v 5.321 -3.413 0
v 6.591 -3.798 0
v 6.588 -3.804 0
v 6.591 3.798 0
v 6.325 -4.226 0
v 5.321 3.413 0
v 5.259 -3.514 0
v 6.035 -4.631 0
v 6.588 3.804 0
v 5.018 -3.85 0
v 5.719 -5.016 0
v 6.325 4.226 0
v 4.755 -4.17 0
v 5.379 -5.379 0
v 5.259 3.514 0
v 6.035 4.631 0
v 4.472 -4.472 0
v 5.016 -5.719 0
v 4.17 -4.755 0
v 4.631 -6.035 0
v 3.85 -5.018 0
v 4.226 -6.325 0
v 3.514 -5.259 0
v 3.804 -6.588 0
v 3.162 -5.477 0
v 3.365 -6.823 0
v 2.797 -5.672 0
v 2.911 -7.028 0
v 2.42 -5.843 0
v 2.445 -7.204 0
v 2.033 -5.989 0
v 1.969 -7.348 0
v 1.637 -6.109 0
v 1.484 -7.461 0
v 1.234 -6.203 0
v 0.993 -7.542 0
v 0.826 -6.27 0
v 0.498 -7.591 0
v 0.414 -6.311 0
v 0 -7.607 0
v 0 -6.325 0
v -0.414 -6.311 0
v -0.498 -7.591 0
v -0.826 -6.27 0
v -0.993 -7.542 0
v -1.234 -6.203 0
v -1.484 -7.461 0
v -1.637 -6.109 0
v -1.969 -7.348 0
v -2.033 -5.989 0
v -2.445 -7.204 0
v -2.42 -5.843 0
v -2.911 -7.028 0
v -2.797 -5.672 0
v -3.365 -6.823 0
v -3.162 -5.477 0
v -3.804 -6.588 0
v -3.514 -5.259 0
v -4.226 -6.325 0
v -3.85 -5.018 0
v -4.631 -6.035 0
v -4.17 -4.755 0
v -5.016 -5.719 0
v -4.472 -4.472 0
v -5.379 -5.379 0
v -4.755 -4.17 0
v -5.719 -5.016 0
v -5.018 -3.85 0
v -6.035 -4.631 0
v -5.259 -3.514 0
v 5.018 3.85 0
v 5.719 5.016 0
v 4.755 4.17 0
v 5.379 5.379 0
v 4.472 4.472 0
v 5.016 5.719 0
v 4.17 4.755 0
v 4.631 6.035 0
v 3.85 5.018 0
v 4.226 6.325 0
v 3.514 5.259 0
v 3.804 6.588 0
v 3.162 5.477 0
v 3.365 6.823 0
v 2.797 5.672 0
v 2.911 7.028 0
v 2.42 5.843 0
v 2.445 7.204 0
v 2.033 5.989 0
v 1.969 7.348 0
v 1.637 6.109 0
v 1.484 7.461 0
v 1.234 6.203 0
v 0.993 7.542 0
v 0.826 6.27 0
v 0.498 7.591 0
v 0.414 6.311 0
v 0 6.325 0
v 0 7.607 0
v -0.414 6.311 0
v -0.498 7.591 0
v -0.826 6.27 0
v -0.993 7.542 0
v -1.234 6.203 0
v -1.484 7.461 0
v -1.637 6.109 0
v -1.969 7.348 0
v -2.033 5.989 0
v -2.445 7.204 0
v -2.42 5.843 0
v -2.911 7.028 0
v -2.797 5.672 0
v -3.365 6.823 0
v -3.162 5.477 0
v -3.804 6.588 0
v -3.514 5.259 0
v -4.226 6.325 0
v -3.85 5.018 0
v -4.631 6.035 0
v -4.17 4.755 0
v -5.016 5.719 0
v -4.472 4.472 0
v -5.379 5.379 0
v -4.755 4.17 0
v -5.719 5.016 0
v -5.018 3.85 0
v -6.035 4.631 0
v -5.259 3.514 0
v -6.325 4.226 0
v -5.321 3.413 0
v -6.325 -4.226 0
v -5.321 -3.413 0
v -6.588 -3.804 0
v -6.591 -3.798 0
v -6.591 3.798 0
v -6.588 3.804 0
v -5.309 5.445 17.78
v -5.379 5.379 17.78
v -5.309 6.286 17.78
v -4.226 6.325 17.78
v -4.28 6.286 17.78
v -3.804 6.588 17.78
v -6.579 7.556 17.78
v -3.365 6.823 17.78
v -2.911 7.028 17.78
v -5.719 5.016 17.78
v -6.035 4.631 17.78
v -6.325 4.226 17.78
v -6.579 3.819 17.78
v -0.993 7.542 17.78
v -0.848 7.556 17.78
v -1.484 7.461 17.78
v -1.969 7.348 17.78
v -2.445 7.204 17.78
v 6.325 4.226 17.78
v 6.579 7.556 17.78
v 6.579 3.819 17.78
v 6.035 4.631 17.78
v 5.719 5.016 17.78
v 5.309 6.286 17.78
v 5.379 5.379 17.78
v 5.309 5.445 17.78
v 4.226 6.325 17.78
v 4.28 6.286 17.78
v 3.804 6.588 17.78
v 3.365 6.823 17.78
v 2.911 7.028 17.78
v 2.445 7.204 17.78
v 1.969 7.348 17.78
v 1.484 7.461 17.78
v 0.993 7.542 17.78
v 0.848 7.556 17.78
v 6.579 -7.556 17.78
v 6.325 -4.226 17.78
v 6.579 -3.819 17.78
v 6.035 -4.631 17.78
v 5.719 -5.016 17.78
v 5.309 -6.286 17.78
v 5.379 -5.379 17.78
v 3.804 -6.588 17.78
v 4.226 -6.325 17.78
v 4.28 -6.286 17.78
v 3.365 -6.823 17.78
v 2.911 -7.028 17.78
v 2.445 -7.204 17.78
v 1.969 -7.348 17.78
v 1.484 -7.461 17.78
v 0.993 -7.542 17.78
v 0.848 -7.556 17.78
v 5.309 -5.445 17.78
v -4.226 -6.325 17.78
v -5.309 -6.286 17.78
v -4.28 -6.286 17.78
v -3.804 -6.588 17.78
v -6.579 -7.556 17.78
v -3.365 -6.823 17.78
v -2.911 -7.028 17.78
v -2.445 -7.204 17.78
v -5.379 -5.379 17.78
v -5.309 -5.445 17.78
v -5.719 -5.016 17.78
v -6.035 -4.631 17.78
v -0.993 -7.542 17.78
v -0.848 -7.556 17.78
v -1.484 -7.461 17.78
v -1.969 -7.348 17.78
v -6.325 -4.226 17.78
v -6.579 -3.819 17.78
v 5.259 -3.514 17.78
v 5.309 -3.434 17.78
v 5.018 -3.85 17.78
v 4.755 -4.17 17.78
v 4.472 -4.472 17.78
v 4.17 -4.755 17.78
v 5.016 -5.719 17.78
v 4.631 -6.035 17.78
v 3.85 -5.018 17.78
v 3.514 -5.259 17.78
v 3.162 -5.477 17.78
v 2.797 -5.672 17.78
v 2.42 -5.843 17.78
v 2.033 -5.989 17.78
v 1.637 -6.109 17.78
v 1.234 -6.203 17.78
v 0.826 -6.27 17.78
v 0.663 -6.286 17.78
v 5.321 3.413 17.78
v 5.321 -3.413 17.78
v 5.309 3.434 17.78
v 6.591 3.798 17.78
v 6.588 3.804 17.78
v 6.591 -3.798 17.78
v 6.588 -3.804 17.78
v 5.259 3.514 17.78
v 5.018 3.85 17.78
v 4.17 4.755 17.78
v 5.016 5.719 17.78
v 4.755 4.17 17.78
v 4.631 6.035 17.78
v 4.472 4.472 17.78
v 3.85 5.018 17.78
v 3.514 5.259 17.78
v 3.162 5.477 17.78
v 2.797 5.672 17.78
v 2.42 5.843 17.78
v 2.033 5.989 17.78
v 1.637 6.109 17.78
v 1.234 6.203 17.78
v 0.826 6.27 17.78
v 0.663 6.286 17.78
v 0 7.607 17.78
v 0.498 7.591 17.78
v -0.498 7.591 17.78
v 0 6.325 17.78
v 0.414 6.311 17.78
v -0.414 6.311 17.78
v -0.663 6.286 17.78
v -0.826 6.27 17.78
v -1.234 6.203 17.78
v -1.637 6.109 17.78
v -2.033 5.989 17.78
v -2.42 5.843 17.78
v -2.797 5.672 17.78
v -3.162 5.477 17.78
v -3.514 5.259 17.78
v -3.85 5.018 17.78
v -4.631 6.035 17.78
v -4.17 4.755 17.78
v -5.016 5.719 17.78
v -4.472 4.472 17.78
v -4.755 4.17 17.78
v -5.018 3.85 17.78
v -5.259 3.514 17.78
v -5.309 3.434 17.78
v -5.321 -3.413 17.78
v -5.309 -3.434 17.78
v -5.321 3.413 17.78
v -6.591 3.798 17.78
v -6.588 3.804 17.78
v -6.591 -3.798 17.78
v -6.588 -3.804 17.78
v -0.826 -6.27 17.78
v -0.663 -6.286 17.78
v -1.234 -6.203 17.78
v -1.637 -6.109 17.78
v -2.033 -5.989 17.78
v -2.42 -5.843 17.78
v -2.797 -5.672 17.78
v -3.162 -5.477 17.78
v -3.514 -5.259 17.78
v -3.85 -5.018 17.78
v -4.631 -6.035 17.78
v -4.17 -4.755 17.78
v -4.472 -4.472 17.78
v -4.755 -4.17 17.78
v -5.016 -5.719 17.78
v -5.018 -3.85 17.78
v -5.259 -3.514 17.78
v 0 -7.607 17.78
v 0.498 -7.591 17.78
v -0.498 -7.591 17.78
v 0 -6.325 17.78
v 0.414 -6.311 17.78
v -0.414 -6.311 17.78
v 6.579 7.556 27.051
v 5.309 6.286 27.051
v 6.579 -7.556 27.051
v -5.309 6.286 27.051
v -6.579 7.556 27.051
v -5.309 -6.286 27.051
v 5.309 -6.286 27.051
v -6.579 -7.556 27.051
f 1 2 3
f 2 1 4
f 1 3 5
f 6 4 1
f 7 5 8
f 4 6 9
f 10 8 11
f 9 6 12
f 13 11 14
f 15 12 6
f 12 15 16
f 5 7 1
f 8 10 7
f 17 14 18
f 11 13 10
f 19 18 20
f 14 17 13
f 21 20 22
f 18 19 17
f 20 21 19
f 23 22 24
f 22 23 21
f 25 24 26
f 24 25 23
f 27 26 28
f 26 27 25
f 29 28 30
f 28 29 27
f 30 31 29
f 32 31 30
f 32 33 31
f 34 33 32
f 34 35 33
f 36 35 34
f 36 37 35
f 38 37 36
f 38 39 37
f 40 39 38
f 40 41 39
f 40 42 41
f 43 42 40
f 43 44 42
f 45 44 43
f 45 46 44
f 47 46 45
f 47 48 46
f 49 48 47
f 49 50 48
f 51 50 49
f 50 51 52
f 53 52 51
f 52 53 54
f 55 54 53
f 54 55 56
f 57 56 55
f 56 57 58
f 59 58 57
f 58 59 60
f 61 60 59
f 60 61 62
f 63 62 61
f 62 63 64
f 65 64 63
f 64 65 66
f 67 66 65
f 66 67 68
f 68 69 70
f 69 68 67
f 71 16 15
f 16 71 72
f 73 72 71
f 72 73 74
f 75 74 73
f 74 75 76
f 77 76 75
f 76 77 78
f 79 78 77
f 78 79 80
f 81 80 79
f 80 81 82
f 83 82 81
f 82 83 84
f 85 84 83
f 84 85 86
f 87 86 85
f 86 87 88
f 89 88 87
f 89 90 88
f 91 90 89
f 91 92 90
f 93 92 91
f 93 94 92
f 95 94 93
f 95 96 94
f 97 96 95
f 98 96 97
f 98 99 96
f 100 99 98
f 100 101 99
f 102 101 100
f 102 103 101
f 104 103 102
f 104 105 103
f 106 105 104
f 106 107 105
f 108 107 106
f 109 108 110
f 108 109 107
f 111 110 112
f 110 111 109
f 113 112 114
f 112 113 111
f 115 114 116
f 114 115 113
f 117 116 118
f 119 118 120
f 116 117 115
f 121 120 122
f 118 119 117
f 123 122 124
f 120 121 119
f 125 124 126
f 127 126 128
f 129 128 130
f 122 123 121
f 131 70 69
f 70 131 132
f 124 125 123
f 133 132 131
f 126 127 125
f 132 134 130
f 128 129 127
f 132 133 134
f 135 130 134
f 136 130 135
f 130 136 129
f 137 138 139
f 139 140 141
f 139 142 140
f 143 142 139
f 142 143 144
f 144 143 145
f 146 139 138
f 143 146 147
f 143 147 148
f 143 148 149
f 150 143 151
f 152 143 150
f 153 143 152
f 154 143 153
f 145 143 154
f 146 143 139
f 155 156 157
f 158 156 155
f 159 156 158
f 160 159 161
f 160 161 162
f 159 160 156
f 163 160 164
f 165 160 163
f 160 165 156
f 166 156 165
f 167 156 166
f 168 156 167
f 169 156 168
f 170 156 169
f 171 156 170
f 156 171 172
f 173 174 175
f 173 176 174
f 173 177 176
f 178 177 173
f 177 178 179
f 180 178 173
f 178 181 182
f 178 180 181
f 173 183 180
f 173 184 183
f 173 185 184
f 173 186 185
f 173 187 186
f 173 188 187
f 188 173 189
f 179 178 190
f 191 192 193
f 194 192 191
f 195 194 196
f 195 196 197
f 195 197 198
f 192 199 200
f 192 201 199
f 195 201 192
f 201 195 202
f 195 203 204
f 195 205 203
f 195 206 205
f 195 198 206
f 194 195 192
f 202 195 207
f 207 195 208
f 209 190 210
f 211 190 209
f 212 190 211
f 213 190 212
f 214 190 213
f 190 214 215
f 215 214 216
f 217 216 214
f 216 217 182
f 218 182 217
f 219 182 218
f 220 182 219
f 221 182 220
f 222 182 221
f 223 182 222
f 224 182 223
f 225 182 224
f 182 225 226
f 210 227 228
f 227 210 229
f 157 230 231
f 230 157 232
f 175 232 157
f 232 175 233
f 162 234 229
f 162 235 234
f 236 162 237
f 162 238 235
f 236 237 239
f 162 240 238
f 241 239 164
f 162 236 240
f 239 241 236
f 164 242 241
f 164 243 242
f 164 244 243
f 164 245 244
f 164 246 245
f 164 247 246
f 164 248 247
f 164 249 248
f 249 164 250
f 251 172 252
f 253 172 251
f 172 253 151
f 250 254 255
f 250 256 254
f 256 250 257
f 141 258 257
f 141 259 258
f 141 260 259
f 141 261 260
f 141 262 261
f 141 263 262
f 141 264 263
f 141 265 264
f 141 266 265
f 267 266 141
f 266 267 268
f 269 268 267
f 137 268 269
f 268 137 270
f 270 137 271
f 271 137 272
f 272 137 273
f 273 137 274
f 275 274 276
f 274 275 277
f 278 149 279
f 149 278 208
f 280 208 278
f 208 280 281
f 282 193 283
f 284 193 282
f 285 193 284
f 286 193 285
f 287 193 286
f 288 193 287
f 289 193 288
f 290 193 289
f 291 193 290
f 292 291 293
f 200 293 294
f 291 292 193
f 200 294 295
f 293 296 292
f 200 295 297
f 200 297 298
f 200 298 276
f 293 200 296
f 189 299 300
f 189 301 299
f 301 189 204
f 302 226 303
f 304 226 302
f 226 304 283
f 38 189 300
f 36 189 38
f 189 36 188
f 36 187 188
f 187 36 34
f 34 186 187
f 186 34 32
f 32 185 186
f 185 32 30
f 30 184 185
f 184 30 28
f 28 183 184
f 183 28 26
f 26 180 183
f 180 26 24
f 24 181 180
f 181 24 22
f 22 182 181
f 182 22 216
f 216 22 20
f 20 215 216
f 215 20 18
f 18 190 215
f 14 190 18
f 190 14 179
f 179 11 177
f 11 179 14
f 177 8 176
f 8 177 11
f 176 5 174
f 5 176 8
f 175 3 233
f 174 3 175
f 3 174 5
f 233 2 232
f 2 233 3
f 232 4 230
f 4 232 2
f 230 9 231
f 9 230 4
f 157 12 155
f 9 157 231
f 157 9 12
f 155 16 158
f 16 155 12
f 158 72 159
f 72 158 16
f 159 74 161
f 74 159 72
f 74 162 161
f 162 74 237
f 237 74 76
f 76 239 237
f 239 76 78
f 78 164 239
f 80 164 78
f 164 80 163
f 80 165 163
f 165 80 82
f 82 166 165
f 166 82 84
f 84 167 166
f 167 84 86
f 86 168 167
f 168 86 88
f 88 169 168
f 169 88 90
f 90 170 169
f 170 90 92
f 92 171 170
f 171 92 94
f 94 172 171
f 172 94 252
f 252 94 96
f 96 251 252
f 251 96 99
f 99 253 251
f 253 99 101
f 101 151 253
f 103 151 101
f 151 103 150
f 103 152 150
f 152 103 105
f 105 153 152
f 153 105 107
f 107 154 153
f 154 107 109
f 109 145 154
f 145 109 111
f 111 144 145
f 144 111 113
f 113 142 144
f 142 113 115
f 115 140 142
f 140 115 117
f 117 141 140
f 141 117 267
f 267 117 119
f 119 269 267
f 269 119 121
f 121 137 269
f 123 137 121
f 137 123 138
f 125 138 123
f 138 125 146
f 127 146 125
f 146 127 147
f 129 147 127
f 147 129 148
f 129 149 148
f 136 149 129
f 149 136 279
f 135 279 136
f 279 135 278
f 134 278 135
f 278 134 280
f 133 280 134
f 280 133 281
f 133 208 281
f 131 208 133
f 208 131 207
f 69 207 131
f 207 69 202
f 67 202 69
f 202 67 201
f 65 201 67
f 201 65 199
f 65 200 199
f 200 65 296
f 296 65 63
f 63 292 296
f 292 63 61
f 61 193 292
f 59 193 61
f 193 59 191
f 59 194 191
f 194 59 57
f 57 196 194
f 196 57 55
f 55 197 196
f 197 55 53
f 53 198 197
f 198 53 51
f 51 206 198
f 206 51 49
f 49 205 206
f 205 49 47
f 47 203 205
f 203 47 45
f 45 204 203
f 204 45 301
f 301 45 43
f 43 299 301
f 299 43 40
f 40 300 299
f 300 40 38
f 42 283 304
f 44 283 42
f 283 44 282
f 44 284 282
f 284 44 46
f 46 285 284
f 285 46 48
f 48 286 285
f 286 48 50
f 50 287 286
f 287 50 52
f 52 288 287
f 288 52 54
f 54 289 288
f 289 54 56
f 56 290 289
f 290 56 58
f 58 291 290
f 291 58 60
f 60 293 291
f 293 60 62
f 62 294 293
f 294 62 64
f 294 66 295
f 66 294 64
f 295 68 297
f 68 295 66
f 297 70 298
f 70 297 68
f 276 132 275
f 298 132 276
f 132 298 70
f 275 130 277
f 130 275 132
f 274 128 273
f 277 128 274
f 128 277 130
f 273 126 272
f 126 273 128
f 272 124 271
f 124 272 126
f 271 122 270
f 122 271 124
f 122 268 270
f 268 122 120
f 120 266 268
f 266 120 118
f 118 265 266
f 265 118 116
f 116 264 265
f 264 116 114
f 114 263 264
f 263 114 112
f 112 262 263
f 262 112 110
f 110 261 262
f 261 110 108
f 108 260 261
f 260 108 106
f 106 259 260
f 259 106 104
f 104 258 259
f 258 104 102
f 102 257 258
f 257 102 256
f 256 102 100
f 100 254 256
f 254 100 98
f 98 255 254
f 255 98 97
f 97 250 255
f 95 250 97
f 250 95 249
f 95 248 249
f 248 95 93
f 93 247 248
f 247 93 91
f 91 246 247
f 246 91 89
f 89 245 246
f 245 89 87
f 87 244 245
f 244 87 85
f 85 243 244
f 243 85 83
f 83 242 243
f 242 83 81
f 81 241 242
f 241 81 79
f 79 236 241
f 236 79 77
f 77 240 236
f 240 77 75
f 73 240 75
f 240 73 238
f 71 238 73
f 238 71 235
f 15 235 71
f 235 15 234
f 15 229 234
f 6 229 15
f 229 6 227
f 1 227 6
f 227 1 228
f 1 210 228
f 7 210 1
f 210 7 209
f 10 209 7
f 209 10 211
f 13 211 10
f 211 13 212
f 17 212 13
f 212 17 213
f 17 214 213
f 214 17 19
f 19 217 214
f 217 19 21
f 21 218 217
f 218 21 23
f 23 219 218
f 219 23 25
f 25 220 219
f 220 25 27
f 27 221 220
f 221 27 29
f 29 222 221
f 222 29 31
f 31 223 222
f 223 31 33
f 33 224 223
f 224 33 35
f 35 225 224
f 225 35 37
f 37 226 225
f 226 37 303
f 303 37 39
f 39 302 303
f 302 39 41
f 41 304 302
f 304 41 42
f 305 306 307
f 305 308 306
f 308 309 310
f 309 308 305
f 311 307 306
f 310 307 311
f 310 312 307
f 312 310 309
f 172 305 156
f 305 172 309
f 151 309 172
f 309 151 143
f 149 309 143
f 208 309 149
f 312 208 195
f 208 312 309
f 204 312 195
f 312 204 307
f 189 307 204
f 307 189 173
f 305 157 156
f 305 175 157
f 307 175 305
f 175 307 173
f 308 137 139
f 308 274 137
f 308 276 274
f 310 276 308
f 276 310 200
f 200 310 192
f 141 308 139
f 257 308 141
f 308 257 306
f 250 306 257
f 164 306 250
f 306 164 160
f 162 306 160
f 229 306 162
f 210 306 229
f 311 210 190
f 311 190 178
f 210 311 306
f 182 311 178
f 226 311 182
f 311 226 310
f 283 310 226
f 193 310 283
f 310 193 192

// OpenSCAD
ViewScale = [0.0254, 0.0254, 0.0254];
clearance = 25;

module motor_housing()
{
    // motor body
    difference() {
    intersection() {
    circle((574+clearance)/2, $fn=96);
    square([494+clearance,650], center=true);
    }
    intersection() {
    circle((473+clearance)/2, $fn=96);
    square([394+clearance,550], center=true);
    }}
}

module gear_housing()
{
    difference() {
    square([493+clearance, 570+clearance], center=true);
    square([393+clearance, 470+clearance], center=true);
    }
}

//module housing()
scale(ViewScale)
{
    //model_geared2();
    linear_extrude(700)
    motor_housing();
    translate([0, 0, 700])
    linear_extrude(365)
    gear_housing();
}
